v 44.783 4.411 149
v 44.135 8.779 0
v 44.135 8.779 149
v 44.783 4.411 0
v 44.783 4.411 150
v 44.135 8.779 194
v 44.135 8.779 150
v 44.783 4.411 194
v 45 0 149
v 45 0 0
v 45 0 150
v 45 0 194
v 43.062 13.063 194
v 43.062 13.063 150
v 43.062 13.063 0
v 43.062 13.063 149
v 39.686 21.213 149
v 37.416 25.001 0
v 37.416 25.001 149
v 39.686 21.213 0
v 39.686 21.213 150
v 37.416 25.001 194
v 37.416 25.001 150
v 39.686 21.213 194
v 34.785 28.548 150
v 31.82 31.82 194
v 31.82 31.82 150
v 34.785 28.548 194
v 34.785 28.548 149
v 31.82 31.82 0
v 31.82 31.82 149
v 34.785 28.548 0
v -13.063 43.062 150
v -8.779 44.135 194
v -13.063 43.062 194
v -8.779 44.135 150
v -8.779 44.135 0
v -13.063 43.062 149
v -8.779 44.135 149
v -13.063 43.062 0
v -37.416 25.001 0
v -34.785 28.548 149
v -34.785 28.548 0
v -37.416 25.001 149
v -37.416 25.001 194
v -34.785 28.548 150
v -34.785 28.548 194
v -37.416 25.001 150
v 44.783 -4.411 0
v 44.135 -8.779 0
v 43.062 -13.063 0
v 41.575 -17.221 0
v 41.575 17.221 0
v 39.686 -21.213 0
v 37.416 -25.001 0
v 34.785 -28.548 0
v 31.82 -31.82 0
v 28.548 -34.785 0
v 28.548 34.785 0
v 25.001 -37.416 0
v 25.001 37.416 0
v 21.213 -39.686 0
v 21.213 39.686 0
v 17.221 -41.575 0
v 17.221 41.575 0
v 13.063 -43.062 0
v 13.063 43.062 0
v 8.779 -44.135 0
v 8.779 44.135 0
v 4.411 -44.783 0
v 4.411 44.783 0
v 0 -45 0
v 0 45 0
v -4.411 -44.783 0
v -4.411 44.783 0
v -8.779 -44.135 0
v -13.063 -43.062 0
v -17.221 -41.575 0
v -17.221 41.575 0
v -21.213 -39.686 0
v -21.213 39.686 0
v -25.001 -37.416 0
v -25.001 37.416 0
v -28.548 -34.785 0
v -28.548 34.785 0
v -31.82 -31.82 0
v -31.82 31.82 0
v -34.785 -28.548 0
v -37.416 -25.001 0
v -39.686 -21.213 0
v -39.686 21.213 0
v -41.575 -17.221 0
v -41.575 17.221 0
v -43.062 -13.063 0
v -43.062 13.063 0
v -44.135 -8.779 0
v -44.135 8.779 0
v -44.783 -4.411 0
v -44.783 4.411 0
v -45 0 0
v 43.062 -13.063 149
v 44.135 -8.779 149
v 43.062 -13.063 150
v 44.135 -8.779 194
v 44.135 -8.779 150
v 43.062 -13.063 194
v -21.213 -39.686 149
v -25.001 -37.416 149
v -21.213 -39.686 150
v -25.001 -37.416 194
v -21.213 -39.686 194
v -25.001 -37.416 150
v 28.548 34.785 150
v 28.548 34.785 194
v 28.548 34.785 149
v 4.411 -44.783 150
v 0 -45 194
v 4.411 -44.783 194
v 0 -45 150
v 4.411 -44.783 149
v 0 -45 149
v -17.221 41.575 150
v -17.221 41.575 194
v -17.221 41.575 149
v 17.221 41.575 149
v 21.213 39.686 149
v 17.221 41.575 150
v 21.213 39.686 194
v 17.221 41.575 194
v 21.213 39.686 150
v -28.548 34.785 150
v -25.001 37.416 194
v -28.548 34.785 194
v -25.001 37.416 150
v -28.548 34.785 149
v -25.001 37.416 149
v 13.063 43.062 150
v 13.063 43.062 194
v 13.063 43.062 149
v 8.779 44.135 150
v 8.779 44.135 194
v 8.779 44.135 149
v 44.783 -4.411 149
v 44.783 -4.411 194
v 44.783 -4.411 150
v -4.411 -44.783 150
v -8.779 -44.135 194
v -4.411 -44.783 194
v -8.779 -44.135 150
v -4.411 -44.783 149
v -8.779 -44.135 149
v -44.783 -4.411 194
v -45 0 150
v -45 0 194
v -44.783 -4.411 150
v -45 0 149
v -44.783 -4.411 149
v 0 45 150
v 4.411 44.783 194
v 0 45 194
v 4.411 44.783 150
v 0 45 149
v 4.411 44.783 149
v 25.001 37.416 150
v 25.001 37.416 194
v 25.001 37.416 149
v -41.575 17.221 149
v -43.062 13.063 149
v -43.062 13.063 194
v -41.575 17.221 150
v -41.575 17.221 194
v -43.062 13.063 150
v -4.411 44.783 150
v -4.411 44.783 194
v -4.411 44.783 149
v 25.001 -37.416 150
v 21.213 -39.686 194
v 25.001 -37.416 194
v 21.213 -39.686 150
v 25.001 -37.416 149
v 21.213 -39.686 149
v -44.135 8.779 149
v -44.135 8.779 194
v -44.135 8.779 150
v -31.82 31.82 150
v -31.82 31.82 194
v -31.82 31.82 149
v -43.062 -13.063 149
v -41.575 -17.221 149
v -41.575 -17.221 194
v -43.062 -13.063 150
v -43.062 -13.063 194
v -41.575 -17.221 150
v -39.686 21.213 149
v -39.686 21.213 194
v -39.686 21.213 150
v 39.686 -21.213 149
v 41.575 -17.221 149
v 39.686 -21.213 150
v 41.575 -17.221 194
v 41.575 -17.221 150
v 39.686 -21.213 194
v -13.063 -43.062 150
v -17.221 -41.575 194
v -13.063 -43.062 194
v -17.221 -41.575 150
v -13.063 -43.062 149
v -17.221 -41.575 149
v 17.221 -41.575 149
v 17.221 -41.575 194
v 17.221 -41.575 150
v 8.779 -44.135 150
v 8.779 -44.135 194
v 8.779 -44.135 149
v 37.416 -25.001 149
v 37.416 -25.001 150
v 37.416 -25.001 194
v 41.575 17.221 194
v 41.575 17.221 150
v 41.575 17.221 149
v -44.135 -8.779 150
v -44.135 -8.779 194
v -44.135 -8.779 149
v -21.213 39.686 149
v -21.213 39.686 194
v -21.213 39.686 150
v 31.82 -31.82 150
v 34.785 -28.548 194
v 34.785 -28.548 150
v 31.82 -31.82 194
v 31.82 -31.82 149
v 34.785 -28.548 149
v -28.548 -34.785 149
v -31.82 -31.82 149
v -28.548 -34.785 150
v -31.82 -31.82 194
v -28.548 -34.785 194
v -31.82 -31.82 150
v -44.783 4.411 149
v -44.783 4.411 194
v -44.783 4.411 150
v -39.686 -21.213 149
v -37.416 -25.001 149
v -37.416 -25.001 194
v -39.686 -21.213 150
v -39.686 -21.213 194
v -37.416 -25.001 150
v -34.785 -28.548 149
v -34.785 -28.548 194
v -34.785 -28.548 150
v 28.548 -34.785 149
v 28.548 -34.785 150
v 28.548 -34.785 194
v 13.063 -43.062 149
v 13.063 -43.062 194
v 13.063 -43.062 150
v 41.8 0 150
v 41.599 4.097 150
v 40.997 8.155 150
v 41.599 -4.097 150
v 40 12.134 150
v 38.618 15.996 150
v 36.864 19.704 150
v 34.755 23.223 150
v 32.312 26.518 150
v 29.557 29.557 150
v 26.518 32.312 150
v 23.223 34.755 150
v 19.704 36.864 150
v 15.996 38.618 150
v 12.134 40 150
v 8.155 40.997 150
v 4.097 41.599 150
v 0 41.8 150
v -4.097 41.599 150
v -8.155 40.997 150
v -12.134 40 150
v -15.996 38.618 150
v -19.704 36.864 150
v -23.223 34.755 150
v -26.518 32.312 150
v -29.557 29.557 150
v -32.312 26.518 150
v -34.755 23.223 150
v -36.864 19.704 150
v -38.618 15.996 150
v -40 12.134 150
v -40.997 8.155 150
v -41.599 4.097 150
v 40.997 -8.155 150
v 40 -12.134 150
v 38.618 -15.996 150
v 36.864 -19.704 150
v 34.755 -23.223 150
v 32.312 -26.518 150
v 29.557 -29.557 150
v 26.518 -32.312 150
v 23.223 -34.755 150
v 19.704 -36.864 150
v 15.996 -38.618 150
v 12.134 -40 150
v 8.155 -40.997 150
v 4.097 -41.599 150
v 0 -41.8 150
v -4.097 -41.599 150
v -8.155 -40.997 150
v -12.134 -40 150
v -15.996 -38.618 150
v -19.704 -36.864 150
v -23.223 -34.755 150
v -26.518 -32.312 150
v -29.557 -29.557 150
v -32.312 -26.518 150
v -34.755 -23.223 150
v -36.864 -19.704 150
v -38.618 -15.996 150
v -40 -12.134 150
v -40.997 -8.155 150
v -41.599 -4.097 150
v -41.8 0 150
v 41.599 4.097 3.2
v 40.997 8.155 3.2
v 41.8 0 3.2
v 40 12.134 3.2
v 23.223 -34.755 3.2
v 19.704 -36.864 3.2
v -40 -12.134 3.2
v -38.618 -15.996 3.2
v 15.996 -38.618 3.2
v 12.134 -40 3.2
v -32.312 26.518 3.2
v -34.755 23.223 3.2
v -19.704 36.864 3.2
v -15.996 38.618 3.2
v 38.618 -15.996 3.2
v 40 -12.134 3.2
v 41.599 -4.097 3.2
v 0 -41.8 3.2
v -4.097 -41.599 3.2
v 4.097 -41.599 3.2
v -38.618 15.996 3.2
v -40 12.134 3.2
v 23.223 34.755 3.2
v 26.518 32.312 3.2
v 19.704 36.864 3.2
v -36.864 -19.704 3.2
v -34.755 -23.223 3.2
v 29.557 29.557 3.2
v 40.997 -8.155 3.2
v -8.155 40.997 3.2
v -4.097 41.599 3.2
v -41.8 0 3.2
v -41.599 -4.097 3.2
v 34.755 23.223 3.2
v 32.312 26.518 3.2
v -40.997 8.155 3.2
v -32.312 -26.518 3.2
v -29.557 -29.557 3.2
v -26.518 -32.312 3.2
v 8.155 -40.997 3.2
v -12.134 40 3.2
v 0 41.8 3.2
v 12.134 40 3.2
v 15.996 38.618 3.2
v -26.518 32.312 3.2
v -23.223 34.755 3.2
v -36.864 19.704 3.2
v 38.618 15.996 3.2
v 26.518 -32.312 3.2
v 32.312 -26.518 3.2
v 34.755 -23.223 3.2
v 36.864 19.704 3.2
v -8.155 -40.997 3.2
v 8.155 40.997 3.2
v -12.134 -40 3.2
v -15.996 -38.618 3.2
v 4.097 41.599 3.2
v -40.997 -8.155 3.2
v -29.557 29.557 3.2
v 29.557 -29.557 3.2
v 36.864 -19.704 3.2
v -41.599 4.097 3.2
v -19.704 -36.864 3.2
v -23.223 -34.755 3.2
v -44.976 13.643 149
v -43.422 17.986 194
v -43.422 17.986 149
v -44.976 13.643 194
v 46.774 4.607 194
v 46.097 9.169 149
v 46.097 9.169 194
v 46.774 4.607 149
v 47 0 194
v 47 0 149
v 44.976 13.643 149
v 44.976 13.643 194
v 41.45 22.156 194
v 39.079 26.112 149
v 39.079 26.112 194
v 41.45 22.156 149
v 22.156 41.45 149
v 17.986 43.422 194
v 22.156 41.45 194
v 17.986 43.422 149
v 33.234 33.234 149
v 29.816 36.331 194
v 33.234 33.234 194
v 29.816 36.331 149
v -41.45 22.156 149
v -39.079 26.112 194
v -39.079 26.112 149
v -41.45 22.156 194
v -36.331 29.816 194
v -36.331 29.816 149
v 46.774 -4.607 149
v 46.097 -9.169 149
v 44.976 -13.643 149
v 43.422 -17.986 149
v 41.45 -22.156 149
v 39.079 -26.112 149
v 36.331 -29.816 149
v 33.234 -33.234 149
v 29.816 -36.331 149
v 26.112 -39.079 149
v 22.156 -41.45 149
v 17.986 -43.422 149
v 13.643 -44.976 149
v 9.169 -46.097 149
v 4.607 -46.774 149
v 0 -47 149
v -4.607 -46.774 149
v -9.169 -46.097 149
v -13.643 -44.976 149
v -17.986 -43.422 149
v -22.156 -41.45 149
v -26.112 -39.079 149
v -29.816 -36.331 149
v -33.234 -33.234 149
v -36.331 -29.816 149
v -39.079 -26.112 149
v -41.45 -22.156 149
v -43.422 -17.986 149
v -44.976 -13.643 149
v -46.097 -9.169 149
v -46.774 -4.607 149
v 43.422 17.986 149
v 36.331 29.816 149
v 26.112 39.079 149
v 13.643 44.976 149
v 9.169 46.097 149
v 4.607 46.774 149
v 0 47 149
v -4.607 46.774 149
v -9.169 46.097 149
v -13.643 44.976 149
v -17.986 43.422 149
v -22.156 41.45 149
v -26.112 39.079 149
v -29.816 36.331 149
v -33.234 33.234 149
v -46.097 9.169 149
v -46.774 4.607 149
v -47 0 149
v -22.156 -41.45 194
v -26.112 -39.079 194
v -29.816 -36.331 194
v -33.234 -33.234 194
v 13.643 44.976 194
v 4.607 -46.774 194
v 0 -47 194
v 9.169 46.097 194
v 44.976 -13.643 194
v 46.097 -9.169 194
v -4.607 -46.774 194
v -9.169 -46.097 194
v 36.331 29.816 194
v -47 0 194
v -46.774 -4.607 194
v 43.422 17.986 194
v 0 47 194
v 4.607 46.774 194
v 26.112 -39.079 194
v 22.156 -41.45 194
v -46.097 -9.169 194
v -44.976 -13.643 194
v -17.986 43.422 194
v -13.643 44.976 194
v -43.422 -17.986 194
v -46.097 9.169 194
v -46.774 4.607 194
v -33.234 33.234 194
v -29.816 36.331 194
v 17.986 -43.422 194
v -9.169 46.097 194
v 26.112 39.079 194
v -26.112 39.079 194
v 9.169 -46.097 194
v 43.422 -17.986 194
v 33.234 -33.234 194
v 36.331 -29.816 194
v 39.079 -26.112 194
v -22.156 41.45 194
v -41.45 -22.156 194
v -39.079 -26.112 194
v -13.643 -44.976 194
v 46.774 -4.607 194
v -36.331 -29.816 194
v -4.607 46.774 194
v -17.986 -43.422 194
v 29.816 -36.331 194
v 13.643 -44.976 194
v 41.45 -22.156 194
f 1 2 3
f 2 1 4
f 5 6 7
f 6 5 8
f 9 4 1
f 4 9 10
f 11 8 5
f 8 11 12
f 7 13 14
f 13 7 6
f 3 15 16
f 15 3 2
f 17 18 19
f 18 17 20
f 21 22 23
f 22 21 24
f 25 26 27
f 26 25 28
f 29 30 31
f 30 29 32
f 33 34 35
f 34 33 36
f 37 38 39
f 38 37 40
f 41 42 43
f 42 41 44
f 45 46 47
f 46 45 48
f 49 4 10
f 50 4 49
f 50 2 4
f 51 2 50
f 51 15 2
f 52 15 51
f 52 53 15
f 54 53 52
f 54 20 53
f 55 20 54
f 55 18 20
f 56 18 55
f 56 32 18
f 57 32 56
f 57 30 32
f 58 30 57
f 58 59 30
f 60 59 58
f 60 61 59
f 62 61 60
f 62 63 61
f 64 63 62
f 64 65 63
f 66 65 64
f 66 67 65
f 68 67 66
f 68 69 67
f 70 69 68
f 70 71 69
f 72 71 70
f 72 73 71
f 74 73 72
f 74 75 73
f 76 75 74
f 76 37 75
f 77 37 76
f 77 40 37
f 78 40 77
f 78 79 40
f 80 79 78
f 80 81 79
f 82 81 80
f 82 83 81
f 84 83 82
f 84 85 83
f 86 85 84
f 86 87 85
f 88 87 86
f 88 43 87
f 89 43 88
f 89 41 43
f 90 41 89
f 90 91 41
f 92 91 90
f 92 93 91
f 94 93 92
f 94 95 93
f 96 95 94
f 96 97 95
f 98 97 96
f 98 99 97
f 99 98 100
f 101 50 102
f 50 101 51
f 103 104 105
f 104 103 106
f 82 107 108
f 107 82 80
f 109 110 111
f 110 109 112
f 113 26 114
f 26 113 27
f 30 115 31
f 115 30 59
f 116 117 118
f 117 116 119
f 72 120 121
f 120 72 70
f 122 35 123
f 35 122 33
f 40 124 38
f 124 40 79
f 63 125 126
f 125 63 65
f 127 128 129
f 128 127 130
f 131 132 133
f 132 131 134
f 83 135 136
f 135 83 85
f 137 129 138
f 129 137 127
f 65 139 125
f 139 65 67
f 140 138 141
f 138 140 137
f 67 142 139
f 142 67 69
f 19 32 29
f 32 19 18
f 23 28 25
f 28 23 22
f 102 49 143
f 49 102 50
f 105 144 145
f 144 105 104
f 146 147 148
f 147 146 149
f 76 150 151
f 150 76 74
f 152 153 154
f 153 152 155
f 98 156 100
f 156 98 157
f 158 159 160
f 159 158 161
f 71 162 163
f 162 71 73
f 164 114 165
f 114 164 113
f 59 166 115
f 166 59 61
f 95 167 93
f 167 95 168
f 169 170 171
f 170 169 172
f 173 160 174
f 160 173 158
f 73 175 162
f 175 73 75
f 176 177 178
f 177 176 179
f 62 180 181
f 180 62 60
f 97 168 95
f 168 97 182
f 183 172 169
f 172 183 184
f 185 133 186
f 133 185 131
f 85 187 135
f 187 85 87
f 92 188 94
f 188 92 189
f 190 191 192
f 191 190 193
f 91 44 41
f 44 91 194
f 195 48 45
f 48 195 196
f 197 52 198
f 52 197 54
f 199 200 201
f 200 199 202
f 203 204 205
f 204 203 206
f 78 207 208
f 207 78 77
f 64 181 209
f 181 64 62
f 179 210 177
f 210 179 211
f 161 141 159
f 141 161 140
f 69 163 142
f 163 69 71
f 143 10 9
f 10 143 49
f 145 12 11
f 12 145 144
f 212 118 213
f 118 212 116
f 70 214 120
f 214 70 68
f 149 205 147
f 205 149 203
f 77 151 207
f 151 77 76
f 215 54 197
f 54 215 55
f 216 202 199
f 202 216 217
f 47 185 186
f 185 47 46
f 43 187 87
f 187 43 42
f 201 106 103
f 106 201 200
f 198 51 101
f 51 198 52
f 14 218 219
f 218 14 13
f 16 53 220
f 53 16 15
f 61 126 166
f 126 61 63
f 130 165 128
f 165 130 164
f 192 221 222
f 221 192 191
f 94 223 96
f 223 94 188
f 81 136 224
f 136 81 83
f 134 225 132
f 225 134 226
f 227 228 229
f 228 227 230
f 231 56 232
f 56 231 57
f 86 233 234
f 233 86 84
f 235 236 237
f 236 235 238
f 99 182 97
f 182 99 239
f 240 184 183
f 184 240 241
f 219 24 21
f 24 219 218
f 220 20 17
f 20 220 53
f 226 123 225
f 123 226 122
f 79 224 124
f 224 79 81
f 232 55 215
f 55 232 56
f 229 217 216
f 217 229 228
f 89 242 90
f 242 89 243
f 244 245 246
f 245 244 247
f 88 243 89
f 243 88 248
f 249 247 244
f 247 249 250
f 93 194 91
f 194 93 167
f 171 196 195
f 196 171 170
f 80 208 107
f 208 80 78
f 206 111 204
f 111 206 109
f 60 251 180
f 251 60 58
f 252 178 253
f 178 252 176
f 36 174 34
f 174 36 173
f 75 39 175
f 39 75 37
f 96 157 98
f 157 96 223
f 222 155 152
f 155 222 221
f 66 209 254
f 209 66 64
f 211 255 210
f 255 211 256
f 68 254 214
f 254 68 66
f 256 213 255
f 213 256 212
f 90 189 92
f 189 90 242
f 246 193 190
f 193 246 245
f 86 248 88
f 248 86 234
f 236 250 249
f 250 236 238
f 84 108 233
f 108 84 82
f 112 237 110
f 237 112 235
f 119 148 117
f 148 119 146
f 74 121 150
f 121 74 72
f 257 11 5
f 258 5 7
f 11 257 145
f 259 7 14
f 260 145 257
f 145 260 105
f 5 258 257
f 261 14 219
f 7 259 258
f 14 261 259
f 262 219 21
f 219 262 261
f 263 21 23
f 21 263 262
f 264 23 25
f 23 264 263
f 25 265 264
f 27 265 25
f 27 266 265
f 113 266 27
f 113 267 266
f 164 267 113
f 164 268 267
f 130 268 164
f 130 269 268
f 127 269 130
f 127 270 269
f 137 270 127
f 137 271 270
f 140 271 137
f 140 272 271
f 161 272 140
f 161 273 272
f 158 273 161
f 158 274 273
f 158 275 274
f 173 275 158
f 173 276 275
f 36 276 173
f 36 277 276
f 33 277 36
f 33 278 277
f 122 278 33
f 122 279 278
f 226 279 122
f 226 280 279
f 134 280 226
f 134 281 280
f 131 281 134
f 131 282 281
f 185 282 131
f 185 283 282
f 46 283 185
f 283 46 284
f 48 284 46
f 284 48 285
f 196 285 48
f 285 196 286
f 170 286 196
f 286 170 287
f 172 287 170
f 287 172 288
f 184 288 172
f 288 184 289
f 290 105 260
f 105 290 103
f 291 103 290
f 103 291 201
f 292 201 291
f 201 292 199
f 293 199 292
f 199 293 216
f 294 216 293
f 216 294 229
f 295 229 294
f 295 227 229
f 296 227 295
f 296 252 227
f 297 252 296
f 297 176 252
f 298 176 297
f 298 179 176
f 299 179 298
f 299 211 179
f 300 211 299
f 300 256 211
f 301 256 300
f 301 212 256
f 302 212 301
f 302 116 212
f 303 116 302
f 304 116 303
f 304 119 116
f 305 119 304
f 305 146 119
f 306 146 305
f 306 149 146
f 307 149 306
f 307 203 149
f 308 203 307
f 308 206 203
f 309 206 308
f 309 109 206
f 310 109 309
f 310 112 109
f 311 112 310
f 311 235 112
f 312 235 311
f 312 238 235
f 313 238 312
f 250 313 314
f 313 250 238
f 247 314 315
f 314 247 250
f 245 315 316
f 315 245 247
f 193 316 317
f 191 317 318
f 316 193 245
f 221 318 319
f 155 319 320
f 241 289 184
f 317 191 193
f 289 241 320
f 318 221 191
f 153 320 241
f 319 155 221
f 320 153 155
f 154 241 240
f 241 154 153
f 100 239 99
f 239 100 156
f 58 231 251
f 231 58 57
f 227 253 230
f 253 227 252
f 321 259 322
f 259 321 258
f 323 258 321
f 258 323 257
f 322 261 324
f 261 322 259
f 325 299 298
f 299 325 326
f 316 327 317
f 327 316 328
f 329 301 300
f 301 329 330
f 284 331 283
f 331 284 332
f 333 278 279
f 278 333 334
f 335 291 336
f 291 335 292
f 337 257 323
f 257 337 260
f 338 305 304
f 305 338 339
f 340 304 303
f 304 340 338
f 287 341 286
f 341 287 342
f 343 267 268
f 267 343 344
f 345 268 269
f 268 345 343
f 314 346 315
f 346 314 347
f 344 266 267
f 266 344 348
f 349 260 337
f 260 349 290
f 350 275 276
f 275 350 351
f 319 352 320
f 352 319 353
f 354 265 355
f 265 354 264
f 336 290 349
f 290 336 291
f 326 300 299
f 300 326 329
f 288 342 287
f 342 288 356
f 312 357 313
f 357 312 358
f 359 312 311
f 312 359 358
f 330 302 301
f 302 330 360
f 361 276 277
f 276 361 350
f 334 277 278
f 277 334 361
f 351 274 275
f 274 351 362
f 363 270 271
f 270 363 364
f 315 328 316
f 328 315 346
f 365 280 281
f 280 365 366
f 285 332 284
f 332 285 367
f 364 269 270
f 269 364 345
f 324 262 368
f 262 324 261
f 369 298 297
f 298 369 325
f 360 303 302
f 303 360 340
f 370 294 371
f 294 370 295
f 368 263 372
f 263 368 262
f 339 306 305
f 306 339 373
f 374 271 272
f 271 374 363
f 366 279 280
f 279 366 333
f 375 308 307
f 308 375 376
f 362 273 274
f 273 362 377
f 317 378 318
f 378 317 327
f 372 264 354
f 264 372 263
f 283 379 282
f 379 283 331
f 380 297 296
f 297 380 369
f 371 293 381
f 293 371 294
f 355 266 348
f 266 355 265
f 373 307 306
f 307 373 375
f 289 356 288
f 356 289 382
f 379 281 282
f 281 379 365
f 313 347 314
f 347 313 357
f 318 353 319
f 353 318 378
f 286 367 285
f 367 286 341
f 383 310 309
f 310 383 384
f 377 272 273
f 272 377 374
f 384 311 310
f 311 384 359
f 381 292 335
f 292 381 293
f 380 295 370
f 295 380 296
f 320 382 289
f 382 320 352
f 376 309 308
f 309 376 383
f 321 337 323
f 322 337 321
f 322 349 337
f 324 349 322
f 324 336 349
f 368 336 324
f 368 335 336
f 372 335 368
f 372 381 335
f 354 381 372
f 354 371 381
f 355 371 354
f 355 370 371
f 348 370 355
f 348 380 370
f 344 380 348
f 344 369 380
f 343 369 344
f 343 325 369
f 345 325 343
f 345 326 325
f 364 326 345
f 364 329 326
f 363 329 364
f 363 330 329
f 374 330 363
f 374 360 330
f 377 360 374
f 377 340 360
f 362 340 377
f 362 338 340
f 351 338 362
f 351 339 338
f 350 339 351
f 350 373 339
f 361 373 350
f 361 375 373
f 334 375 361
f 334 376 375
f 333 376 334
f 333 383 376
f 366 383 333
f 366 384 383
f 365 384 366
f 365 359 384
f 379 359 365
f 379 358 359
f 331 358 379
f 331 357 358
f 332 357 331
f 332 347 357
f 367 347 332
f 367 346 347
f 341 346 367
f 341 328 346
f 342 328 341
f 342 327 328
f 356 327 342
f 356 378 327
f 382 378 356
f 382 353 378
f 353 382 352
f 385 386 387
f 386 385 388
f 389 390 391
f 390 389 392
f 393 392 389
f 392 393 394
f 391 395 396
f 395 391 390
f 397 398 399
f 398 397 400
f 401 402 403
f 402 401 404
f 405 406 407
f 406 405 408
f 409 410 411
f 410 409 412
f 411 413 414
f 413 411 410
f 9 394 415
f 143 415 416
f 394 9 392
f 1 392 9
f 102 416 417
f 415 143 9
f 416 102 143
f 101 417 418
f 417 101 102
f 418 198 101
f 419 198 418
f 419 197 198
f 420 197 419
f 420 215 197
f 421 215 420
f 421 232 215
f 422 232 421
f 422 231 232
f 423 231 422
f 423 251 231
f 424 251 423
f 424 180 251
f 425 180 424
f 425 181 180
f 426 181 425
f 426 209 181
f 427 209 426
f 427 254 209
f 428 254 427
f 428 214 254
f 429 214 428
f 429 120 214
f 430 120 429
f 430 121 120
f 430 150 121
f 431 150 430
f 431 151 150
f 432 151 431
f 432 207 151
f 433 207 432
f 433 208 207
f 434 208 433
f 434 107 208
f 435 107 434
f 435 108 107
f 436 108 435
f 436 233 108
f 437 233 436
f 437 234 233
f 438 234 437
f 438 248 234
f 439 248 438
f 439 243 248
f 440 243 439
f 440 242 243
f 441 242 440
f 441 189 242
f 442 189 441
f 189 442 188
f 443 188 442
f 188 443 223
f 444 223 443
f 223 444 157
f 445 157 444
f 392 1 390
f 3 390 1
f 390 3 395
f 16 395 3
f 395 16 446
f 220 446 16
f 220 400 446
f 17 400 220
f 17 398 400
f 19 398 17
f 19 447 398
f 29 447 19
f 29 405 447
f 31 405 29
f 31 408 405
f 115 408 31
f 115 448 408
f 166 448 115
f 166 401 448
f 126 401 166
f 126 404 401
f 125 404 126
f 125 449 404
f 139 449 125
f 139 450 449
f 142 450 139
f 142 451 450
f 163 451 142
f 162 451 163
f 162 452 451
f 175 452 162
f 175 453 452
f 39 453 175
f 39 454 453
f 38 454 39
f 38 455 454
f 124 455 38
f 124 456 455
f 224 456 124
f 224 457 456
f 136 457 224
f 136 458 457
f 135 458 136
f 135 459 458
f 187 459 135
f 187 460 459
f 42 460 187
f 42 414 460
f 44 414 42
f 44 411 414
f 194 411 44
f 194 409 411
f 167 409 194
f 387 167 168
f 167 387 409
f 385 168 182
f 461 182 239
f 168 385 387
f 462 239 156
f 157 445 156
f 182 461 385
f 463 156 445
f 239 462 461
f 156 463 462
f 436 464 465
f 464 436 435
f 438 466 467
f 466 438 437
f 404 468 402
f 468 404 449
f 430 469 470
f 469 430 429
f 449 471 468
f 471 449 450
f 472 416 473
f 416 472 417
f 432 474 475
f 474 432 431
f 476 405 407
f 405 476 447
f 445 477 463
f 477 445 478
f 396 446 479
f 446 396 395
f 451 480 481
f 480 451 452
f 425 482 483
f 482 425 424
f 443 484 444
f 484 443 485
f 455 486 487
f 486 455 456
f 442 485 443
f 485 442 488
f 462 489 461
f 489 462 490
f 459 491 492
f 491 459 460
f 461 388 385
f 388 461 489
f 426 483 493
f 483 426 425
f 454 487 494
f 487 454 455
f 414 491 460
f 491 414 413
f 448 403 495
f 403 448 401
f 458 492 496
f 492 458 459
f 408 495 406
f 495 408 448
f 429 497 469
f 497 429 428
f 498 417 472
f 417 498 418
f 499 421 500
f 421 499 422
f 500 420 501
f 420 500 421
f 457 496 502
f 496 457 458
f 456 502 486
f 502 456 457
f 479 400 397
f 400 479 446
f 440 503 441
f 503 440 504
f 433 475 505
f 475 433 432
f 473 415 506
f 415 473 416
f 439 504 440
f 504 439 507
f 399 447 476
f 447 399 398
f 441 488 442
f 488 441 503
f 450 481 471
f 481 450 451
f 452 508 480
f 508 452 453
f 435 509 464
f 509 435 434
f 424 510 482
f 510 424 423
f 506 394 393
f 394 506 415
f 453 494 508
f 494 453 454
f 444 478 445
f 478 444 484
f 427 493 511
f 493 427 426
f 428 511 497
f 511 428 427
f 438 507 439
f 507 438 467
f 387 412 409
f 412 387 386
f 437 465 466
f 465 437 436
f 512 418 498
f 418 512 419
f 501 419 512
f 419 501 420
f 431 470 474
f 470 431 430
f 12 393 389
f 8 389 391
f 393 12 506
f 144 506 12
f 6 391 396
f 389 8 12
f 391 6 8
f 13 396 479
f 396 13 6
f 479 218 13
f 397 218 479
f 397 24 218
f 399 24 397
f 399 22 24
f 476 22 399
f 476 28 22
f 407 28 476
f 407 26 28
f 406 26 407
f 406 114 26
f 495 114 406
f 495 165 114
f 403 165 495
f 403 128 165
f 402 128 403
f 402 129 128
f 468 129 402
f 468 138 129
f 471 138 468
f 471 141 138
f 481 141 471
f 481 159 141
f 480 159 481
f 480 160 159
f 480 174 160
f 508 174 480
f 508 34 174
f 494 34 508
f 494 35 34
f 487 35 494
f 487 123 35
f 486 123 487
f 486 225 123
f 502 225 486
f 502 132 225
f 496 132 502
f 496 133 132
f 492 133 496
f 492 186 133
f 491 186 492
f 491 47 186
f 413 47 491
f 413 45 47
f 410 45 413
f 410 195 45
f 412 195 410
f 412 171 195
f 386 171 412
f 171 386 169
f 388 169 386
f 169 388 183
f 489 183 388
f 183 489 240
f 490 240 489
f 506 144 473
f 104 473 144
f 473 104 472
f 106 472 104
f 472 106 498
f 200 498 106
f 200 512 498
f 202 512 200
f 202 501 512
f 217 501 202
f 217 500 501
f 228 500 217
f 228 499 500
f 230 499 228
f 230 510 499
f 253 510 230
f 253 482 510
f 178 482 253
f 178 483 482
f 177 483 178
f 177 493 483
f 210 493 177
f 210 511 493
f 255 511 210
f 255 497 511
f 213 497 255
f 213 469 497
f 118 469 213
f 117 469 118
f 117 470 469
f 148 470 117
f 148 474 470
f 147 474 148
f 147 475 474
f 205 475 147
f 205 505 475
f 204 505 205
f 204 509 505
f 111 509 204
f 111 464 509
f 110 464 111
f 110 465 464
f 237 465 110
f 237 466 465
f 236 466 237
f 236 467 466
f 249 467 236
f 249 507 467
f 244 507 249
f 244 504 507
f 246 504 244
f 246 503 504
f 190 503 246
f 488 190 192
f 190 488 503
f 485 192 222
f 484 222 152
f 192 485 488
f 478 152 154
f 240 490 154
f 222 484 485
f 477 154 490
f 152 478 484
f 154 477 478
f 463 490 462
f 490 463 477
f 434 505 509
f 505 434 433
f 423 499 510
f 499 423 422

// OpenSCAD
// Parameters
pipe_standard = 1; //[1:1:1]
nominal_size = 90; //[45:180:1]
length_mm = 150; //[75:300:1]
orientation_straight = 1; //[1:1:1]
center = 0; //[0:1:1]
pipe_od = 90; //[45:180:1]
pipe_wall = 3.2; //[1.6:6.4:0.1]
socket_length = 45; //[25:90:1]
socket_wall_extra = 2.0; //[1.0:5.0:0.1]
overlap = 1.0; //[0.5:2.0:0.1]

// Module for HT Pipe
module ht_pipe() {
  color([0.85, 0.85, 0.8]) { // PVC color
    union() {
      // Pipe body
      difference() {
        translate([0, 0, 0])
          cylinder(h=length_mm, r=pipe_od/2, center=false, $fn=64);
        translate([0, 0, pipe_wall])
          cylinder(h=length_mm, r=pipe_od/2 - pipe_wall, center=false, $fn=64);
      }
      // End fitting socket
      difference() {
        translate([0, 0, length_mm - overlap])
          cylinder(h=socket_length, r=pipe_od/2 + socket_wall_extra, center=false, $fn=64);
        translate([0, 0, length_mm - overlap])
          cylinder(h=socket_length, r=pipe_od/2, center=false, $fn=64);
      }
    }
  }
}

// Assembly
module assembly() {
  ht_pipe();
}

assembly();
